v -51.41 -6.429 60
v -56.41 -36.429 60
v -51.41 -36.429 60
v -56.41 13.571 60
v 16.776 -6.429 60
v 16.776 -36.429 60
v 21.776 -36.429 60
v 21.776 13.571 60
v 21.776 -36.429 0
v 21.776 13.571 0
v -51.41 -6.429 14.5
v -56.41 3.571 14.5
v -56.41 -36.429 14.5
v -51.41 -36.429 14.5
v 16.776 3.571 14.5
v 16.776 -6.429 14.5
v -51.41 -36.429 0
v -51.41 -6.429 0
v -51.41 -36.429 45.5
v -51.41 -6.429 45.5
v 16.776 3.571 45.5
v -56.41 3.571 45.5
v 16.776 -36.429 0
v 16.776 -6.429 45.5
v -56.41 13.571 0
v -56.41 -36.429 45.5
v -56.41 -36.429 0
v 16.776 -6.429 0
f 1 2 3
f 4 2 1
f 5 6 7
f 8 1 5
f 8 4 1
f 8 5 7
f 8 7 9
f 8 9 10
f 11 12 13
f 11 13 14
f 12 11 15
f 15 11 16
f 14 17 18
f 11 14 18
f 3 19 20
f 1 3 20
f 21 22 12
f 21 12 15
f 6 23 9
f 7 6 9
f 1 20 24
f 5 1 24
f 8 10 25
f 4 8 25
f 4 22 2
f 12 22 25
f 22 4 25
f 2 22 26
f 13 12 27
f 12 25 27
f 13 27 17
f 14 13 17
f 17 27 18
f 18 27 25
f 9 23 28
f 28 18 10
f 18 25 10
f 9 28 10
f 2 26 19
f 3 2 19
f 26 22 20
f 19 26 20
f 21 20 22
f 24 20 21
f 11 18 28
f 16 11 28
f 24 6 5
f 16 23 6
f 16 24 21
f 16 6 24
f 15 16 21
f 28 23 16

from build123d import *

# Parameters (mm, degrees)
SKETCH_1_W          = 5
SKETCH_1_H          = 30
EXTRUDE_1_DEPTH     = 60
SKETCH_2_W          = 68.186813186
SKETCH_2_H          = 31
CUT_EXTRUDE_1_DEPTH = 10
SKETCH_3_W          = 5
SKETCH_3_H          = 31
CUT_EXTRUDE_3_DEPTH = 40


with BuildPart() as part:
    # 草圖1 → 填料-伸長1 (new body)
    with BuildSketch(Plane.XY):
        Polygon((-56.41038016, 13.571428571), (-56.41038016, -6.428571429), (-51.41038016, -6.428571429), (16.776433026, -6.428571429), (21.776433026, -6.428571429), (21.776433026, 13.571428571), align=None)
        with Locations((-53.91038016, -21.428571429)):
            Rectangle(SKETCH_1_W, SKETCH_1_H)
        with Locations((19.276433026, -21.428571429)):
            Rectangle(SKETCH_1_W, SKETCH_1_H)
    extrude(amount=EXTRUDE_1_DEPTH)

    # 草圖2 → 除料-伸長1 (cut)
    with BuildSketch(Plane.XZ.offset(6.428571429)):
        with Locations((-17.316973567, 30)):
            Rectangle(SKETCH_2_W, SKETCH_2_H)
    extrude(amount=-CUT_EXTRUDE_1_DEPTH, mode=Mode.SUBTRACT)

    # 草圖3 → 除料-伸長3 (cut)
    with BuildSketch(Plane.XZ.offset(36.428571429)):
        with Locations((-53.91038016, 30)):
            Rectangle(SKETCH_3_W, SKETCH_3_H)
    extrude(amount=-CUT_EXTRUDE_3_DEPTH, mode=Mode.SUBTRACT)


solid = part.part
